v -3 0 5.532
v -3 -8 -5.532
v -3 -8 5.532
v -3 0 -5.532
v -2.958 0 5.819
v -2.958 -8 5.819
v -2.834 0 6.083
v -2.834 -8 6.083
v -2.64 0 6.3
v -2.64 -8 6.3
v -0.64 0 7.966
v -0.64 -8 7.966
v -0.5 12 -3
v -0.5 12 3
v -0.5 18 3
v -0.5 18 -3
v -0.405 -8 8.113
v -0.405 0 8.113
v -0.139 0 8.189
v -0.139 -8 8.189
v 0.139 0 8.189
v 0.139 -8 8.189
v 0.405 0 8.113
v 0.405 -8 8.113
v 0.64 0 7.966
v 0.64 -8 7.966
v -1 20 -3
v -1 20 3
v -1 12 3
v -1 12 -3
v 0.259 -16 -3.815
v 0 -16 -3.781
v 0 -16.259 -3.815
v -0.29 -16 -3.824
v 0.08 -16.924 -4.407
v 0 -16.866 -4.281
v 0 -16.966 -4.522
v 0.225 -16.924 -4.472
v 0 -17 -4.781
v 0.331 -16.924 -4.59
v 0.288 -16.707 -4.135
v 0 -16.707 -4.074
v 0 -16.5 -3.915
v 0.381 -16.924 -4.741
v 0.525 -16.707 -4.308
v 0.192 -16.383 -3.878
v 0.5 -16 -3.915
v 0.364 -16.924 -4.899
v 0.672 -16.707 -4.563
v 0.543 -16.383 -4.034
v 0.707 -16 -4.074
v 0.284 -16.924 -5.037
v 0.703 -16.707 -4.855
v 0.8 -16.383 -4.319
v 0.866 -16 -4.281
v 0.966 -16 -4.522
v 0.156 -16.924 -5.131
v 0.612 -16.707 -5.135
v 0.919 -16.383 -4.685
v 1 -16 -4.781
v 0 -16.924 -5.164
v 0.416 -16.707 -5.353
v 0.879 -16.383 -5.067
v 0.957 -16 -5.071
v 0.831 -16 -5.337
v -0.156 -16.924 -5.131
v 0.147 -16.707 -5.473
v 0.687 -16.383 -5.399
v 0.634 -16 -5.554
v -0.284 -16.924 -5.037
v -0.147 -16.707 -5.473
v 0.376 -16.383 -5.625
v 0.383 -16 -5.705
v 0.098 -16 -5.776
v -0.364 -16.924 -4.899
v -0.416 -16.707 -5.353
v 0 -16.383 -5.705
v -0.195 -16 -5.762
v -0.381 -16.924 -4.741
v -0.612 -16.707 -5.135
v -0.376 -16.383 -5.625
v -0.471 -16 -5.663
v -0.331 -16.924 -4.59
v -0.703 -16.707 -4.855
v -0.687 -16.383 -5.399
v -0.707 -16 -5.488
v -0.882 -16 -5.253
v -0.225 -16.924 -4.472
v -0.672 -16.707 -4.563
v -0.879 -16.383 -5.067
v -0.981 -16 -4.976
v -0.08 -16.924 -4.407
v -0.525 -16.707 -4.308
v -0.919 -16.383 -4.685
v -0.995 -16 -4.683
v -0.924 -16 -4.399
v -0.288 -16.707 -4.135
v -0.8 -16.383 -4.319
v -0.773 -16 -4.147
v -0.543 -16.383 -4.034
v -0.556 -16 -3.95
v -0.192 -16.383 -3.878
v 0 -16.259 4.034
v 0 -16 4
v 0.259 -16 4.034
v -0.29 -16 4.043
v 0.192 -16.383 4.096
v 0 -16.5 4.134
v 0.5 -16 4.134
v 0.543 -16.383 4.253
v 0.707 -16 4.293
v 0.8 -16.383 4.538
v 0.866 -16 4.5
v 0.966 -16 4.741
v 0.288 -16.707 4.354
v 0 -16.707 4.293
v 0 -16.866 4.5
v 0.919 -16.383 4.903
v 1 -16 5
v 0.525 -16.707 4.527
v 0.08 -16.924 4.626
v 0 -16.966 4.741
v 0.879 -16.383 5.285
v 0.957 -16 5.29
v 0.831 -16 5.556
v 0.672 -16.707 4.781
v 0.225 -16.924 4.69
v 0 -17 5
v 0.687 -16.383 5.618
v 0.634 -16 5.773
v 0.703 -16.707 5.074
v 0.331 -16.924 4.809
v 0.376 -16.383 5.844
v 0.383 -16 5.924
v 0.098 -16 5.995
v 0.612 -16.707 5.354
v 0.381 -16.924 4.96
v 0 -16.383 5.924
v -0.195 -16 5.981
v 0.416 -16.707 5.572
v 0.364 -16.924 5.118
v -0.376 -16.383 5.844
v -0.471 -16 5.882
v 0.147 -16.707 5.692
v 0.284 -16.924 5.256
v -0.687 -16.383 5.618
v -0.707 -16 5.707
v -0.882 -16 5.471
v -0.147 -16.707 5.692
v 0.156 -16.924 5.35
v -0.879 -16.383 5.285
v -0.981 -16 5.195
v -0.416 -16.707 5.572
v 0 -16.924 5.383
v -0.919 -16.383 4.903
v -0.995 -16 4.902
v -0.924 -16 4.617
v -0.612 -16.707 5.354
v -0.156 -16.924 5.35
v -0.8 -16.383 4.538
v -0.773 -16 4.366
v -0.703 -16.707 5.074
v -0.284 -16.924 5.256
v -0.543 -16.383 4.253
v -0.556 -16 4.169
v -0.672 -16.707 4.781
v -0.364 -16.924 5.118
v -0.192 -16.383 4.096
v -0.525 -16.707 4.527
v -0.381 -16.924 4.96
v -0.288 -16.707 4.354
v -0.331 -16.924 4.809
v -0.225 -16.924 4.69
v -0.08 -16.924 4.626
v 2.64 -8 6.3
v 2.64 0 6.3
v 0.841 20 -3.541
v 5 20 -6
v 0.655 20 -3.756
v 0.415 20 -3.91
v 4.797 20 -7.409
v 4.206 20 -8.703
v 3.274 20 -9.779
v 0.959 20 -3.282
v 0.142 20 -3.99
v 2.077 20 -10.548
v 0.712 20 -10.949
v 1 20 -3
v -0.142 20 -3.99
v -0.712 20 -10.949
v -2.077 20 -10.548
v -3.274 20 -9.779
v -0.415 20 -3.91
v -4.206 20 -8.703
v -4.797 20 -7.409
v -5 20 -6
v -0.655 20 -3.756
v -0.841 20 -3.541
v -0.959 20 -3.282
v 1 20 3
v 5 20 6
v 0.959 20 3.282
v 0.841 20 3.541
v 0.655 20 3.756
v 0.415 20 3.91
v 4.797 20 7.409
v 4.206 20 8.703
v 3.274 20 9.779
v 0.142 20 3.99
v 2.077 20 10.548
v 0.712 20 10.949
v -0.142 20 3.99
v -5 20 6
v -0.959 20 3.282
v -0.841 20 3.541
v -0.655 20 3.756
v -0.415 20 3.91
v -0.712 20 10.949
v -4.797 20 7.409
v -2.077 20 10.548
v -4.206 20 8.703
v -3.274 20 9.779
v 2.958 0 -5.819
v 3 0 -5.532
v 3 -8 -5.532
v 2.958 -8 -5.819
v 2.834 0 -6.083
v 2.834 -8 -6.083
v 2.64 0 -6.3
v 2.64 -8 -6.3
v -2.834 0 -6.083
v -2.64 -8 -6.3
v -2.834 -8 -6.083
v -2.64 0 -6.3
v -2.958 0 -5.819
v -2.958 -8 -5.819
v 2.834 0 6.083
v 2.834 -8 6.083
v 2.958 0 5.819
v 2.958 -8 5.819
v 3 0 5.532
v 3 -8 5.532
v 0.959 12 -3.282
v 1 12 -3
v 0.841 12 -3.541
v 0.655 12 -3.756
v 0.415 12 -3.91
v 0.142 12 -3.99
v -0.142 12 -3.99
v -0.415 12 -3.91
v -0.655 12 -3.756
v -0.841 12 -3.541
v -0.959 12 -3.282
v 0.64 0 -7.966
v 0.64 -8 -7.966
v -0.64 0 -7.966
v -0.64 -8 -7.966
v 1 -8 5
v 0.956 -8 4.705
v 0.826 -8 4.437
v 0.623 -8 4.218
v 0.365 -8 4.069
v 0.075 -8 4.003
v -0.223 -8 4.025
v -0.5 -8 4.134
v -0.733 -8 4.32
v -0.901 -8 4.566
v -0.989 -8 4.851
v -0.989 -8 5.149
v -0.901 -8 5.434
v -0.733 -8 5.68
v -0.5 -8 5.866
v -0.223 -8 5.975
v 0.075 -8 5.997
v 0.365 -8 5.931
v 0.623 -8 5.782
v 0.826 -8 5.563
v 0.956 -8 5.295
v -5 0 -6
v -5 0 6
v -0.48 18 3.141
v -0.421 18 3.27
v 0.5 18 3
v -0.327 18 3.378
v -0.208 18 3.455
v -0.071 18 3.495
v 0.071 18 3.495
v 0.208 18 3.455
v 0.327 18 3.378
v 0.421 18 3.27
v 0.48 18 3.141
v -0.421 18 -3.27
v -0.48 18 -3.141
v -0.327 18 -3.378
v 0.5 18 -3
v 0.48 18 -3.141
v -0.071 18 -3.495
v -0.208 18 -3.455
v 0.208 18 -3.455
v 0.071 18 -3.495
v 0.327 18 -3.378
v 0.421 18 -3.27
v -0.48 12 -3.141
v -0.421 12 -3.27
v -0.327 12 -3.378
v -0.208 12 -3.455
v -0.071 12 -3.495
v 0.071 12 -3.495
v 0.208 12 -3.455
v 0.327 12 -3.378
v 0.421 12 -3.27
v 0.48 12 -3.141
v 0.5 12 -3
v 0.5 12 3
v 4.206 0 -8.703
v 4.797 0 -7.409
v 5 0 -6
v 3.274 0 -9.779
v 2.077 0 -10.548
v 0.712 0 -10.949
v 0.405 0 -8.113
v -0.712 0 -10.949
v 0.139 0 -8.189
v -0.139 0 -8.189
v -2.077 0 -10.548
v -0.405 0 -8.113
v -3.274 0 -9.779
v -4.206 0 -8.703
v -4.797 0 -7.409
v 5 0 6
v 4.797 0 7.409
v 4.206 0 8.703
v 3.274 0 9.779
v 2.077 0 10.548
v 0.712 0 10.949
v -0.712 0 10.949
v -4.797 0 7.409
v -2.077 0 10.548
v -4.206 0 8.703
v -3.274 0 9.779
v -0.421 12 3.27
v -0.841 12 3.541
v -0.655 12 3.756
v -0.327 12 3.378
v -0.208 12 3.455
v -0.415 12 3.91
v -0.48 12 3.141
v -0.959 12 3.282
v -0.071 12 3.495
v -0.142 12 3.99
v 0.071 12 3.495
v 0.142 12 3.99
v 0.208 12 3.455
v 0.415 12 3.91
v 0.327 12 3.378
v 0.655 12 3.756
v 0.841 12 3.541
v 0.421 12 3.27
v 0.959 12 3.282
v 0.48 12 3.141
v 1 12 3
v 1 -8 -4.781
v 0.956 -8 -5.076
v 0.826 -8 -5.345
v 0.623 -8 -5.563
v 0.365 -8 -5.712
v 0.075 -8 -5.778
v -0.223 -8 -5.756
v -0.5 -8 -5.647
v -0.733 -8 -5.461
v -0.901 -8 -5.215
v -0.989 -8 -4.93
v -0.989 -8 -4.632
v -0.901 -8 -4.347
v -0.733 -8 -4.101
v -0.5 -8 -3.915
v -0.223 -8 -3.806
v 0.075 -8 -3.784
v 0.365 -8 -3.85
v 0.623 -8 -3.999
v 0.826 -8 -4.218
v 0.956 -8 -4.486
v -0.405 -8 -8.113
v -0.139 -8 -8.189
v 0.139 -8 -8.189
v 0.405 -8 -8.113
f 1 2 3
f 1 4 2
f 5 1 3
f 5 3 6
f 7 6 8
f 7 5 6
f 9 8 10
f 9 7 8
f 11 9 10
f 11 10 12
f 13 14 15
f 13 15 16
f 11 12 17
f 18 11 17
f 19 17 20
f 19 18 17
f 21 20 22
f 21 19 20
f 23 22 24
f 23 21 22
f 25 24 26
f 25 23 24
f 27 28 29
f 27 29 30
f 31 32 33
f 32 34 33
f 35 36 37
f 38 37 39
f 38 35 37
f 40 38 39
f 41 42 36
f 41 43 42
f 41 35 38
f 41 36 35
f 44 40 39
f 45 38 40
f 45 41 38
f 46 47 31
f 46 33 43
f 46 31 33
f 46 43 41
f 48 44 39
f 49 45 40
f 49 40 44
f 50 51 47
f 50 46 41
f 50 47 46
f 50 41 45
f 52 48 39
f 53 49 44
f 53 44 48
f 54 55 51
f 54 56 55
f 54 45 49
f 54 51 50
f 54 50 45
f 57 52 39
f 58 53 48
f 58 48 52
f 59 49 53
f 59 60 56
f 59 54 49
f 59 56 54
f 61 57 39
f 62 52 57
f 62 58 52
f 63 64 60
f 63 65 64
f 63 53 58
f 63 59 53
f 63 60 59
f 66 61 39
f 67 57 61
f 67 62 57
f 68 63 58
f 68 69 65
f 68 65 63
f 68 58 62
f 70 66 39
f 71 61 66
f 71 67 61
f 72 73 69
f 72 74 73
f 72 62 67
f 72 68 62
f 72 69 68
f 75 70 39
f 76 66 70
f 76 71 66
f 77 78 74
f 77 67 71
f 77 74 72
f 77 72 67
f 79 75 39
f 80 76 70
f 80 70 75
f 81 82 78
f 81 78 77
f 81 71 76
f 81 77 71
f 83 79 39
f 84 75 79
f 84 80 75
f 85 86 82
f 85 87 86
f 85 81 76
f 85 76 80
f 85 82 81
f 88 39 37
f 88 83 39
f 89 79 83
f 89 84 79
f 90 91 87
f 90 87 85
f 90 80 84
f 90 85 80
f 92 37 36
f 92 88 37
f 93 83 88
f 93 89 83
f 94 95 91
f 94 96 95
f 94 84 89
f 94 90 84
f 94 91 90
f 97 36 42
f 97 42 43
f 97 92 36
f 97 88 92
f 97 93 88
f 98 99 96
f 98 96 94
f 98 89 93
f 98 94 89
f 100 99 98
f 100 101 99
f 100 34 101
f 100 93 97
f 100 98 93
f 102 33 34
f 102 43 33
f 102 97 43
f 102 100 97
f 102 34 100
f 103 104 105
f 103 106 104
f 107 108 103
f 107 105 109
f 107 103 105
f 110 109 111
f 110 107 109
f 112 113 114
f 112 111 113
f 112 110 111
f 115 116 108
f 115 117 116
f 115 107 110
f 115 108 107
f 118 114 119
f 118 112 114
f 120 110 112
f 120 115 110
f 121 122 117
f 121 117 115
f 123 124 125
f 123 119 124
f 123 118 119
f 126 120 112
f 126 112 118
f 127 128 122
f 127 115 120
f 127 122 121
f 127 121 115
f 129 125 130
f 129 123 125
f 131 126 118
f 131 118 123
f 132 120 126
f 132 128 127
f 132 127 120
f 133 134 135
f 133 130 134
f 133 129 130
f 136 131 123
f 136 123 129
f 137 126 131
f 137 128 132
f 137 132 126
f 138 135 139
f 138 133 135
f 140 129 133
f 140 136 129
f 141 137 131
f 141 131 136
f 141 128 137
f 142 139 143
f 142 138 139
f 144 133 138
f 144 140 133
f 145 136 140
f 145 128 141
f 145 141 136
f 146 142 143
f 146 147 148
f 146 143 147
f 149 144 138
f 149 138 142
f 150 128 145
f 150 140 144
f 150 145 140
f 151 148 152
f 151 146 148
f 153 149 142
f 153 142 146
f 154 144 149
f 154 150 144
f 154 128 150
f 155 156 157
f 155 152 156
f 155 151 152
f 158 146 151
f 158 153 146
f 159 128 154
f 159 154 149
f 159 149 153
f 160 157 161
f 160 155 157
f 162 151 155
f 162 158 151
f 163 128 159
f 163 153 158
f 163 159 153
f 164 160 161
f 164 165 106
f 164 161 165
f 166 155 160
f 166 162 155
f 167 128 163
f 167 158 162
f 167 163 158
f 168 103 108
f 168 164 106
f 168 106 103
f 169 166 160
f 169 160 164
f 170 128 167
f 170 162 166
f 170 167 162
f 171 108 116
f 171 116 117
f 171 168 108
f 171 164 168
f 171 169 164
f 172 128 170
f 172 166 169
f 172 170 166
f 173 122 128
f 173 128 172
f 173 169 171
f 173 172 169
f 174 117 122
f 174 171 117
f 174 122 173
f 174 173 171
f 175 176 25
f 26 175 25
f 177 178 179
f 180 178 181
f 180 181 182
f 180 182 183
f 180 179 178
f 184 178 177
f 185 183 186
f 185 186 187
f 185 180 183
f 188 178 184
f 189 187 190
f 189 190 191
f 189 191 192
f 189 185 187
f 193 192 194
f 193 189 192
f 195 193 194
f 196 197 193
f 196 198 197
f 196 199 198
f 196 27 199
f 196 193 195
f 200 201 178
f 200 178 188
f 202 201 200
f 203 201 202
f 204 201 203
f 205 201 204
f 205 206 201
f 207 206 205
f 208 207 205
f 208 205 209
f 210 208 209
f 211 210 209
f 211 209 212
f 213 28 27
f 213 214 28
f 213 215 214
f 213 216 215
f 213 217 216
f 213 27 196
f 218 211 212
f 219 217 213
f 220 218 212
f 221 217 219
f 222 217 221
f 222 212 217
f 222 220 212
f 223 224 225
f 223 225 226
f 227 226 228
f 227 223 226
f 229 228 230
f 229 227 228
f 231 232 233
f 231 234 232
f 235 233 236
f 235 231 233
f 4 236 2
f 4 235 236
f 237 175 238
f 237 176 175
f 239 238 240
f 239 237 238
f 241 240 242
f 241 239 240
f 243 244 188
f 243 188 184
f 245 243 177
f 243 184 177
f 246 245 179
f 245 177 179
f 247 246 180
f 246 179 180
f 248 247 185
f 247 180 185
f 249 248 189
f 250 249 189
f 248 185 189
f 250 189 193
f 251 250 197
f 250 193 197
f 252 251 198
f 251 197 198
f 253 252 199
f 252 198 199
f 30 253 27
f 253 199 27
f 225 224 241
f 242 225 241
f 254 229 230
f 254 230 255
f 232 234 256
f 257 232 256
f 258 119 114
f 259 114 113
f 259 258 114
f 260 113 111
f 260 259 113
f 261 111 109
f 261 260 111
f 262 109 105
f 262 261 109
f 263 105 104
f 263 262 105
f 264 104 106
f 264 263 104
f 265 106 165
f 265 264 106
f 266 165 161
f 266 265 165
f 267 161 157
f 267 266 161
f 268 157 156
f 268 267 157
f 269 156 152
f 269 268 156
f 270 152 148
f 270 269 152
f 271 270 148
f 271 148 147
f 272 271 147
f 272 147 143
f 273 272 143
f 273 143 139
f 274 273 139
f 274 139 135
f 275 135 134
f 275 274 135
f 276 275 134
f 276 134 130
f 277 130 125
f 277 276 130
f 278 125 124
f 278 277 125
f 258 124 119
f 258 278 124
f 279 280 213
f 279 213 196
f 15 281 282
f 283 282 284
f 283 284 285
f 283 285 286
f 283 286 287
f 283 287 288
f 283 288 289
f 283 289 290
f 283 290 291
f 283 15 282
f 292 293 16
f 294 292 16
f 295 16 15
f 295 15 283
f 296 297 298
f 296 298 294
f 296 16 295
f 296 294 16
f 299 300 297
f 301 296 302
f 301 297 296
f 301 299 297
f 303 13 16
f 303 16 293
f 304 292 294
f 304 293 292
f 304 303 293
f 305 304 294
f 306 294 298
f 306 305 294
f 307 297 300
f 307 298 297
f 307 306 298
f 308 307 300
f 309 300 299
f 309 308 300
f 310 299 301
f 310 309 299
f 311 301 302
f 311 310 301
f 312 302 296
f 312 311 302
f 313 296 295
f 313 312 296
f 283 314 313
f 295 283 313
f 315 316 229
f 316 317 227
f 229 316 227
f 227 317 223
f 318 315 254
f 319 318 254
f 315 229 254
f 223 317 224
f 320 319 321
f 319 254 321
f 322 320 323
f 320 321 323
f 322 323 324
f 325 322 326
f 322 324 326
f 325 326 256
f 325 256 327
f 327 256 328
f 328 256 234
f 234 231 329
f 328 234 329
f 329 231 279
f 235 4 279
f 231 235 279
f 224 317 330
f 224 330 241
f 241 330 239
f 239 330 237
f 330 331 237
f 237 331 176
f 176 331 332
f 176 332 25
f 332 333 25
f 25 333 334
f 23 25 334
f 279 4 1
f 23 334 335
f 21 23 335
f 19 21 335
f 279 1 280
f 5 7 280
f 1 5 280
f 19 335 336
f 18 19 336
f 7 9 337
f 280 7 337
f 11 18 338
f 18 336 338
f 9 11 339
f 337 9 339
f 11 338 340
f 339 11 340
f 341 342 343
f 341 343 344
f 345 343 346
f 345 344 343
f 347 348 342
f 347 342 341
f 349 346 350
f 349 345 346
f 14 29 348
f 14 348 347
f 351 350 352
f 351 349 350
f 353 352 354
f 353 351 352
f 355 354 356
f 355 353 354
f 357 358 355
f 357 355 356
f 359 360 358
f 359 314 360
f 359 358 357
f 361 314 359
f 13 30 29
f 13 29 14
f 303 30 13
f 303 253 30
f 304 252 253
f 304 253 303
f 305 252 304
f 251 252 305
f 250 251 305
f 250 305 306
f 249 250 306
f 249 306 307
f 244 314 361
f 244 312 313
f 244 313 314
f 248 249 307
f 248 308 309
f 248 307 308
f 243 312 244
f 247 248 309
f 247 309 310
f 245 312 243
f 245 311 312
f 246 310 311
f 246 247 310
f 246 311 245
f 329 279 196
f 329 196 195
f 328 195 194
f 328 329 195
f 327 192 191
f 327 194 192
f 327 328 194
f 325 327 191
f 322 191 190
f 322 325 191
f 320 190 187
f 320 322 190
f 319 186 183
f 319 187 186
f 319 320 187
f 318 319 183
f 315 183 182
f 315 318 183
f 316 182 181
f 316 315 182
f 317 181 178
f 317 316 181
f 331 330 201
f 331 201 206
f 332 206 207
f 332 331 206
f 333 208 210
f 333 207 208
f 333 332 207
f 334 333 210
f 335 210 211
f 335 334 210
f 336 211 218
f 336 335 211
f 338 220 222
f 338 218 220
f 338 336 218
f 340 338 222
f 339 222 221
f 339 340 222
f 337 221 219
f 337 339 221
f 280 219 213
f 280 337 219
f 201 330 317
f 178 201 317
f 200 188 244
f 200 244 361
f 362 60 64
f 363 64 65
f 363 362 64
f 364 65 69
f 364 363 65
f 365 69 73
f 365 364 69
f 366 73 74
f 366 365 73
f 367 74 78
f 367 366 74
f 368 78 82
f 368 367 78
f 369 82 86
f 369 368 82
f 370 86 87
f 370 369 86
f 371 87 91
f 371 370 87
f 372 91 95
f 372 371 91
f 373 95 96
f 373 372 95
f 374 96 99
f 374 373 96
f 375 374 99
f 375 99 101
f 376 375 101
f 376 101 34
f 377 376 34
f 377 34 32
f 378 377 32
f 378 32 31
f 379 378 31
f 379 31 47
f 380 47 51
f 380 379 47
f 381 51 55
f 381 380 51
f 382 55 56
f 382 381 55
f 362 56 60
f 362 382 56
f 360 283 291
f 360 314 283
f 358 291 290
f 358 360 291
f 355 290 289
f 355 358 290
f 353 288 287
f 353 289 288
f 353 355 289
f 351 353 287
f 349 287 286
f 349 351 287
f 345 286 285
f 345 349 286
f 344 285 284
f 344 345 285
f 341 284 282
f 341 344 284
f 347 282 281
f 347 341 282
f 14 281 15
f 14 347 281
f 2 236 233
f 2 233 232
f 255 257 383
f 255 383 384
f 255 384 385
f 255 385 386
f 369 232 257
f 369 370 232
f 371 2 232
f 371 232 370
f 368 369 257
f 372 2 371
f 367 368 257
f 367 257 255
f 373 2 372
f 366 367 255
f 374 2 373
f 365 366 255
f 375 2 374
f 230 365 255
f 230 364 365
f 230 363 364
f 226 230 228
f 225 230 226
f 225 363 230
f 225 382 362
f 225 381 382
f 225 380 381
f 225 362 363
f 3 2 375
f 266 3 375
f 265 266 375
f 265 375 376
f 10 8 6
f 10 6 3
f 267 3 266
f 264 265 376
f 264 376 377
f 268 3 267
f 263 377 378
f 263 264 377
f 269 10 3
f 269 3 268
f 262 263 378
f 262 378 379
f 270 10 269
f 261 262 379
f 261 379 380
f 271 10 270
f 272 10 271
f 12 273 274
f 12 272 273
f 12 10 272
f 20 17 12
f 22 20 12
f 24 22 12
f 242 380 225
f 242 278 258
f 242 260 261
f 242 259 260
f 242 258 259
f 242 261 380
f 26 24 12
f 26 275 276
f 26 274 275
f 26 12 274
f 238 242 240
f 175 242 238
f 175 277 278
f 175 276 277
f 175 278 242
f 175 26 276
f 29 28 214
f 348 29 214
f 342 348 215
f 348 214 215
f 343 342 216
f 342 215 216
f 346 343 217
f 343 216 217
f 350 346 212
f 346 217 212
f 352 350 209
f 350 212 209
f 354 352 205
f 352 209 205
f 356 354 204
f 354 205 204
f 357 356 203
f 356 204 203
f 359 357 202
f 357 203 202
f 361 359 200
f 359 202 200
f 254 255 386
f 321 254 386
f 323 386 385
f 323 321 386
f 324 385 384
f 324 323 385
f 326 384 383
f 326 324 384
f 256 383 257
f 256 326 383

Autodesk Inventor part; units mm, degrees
ref_plane "YZ Plane" through (0, 0, 0) normal (1, 0, 0) x (0, 1, 0)
ref_plane "XZ Plane" through (0, 0, 0) normal (0, 1, 0) x (-1, 0, 0)
ref_plane "XY Plane" through (0, 0, 0) normal (0, 0, 1) x (1, 0, 0)
sketch "스케치1" plane through (0, 0, 0) normal (0, 1, 0) x (-1, 0, 0)
  arc A0 (5, 6) -> (-5, 6) centre (0, 6) ccw
  arc A1 (-5, -6) -> (5, -6) centre (0, -6) ccw
  line L0 (5, 6) -> (5, -6)
  line L1 (-5, 6) -> (-5, -6)
  point P0 (0, 0)
extrude "돌출1" add sketch "스케치1" along normal blind 20
sketch "스케치2" plane through (0, 20, 0) normal (0, 1, 0) x (1, 0, 0)
  line L0 (0, 0) -> (0, 3)
  line L1 (0, 3) -> (0, -3)
  circle A0 centre (0, 3) radius 1
  circle A1 centre (0, -3) radius 1
  line L2 (1, 3) -> (1, -3)
  line L3 (-1, -3) -> (-1, 3)
  dimension "d10" = 3
  dimension "d11" = 6
  dimension "d12" = 2
  dimension "d13" = 2
extrude "돌출2" cut sketch "스케치2" against normal blind 8
sketch "스케치3" plane through (0, 0, 0) normal (0, -1, 0) x (1, 0, 0)
  line L0 (-3, 0) -> (-3, 5.5316)
  line L1 (-2.6402, 6.2998) -> (-0.6402, 7.9665)
  line L2 (-3, 0) -> (-3, -5.5316)
  line L3 (-2.6402, -6.2998) -> (-0.6402, -7.9665)
  line L4 (3, 0) -> (3, 5.5316)
  line L5 (3, 5.5316) -> (3, -5.5316)
  line L6 (2.6402, -6.2998) -> (0.6402, -7.9665)
  line L7 (2.6402, 6.2998) -> (0.6402, 7.9665)
  arc A0 (-0.6402, -7.9665) -> (0.6402, -7.9665) centre (0, -7.1983) ccw
  arc A1 (2.6402, -6.2998) -> (3, -5.5316) centre (2, -5.5316) ccw
  arc A2 (3, 5.5316) -> (2.6402, 6.2998) centre (2, 5.5316) ccw
  arc A3 (0.6402, 7.9665) -> (-0.6402, 7.9665) centre (0, 7.1983) ccw
  arc A4 (-3, -5.5316) -> (-2.6402, -6.2998) centre (-2, -5.5316) ccw
  arc A5 (-2.6402, 6.2998) -> (-3, 5.5316) centre (-2, 5.5316) ccw
  point P0 (0, 0)
  point P1 (-3, -6)
  point P2 (3, -6)
  dimension "d24" = 1
extrude "돌출3" add sketch "스케치3" along normal blind 8
sketch "스케치4" plane through (0, -8, 0) normal (0, -1, 0) x (1, 0, 0)
  line L0 (0, 0) -> (0, 5)
  line L1 (0, 5) -> (0, -5)
  circle A0 centre (0, 5) radius 1
  circle A1 centre (0, -4.7812) radius 1
  dimension "d27" = 5
  dimension "d28" = 10
  dimension "d29" = 2
  dimension "d30" = 2
extrude "돌출4" add sketch "스케치4" along normal blind 8
ref_plane "작업 평면1" through (0, -16, 4) normal (-1, 0, 0) x (0, 0, 1)
sketch "스케치6" plane through (0, -16, 4) normal (-1, 0, 0) x (0, 0, 1)
  line L0 (0, 0) -> (2, 0) projected
  line L1 (0, -1) -> (1, -1) projected
  arc A0 (0, 0) -> (1, -1) centre (1, 0) ccw
  line L2 (1, -1) -> (1, 0)
  line L3 (1, 0) -> (0, 0)
  point P0 (-4, 16)
  point P1 (1, 0)
  point P2 (1, 0)
  dimension "d35" = 1
revolve "회전1" add sketch "스케치6" angle 360 about axis through (0, -17, 5) along (0, 1, 0)
sketch "스케치7" plane through (0, -16, 4) normal (-1, 0, 0) x (0, 0, 1)
  line L0 (-9.7812, 0) -> (-7.7812, 0) projected
  line L1 (-7.7812, 0) -> (-8.7812, 0)
  line L2 (-8.7812, 0) -> (-8.7812, -1)
  arc A0 (-8.7812, -1) -> (-7.7812, 0) centre (-8.7812, 0) ccw
  point P0 (-4, 16)
  dimension "d37" = 1
  dimension "d38" = 1
revolve "회전2" add sketch "스케치7" angle 360 about axis through (0, -16, -4.7812) along (0, -1, 0)
sketch "스케치8" plane through (0, 12, 0) normal (0, 1, 0) x (1, 0, 0)
  line L0 (0, 0) -> (0, 3)
  line L1 (0, 3) -> (0, -3)
  circle A0 centre (0, -3) radius 0.5
  circle A1 centre (0, 3) radius 0.5
  line L2 (-0.5, -3) -> (-0.5, 3)
  line L3 (0.5, -3) -> (0.5, 3)
  dimension "d40" = 3
  dimension "d41" = 6
  dimension "d42" = 1
  dimension "d43" = 1
extrude "돌출6" add sketch "스케치8" along normal blind 6
properties part number "Ctype addapter"
